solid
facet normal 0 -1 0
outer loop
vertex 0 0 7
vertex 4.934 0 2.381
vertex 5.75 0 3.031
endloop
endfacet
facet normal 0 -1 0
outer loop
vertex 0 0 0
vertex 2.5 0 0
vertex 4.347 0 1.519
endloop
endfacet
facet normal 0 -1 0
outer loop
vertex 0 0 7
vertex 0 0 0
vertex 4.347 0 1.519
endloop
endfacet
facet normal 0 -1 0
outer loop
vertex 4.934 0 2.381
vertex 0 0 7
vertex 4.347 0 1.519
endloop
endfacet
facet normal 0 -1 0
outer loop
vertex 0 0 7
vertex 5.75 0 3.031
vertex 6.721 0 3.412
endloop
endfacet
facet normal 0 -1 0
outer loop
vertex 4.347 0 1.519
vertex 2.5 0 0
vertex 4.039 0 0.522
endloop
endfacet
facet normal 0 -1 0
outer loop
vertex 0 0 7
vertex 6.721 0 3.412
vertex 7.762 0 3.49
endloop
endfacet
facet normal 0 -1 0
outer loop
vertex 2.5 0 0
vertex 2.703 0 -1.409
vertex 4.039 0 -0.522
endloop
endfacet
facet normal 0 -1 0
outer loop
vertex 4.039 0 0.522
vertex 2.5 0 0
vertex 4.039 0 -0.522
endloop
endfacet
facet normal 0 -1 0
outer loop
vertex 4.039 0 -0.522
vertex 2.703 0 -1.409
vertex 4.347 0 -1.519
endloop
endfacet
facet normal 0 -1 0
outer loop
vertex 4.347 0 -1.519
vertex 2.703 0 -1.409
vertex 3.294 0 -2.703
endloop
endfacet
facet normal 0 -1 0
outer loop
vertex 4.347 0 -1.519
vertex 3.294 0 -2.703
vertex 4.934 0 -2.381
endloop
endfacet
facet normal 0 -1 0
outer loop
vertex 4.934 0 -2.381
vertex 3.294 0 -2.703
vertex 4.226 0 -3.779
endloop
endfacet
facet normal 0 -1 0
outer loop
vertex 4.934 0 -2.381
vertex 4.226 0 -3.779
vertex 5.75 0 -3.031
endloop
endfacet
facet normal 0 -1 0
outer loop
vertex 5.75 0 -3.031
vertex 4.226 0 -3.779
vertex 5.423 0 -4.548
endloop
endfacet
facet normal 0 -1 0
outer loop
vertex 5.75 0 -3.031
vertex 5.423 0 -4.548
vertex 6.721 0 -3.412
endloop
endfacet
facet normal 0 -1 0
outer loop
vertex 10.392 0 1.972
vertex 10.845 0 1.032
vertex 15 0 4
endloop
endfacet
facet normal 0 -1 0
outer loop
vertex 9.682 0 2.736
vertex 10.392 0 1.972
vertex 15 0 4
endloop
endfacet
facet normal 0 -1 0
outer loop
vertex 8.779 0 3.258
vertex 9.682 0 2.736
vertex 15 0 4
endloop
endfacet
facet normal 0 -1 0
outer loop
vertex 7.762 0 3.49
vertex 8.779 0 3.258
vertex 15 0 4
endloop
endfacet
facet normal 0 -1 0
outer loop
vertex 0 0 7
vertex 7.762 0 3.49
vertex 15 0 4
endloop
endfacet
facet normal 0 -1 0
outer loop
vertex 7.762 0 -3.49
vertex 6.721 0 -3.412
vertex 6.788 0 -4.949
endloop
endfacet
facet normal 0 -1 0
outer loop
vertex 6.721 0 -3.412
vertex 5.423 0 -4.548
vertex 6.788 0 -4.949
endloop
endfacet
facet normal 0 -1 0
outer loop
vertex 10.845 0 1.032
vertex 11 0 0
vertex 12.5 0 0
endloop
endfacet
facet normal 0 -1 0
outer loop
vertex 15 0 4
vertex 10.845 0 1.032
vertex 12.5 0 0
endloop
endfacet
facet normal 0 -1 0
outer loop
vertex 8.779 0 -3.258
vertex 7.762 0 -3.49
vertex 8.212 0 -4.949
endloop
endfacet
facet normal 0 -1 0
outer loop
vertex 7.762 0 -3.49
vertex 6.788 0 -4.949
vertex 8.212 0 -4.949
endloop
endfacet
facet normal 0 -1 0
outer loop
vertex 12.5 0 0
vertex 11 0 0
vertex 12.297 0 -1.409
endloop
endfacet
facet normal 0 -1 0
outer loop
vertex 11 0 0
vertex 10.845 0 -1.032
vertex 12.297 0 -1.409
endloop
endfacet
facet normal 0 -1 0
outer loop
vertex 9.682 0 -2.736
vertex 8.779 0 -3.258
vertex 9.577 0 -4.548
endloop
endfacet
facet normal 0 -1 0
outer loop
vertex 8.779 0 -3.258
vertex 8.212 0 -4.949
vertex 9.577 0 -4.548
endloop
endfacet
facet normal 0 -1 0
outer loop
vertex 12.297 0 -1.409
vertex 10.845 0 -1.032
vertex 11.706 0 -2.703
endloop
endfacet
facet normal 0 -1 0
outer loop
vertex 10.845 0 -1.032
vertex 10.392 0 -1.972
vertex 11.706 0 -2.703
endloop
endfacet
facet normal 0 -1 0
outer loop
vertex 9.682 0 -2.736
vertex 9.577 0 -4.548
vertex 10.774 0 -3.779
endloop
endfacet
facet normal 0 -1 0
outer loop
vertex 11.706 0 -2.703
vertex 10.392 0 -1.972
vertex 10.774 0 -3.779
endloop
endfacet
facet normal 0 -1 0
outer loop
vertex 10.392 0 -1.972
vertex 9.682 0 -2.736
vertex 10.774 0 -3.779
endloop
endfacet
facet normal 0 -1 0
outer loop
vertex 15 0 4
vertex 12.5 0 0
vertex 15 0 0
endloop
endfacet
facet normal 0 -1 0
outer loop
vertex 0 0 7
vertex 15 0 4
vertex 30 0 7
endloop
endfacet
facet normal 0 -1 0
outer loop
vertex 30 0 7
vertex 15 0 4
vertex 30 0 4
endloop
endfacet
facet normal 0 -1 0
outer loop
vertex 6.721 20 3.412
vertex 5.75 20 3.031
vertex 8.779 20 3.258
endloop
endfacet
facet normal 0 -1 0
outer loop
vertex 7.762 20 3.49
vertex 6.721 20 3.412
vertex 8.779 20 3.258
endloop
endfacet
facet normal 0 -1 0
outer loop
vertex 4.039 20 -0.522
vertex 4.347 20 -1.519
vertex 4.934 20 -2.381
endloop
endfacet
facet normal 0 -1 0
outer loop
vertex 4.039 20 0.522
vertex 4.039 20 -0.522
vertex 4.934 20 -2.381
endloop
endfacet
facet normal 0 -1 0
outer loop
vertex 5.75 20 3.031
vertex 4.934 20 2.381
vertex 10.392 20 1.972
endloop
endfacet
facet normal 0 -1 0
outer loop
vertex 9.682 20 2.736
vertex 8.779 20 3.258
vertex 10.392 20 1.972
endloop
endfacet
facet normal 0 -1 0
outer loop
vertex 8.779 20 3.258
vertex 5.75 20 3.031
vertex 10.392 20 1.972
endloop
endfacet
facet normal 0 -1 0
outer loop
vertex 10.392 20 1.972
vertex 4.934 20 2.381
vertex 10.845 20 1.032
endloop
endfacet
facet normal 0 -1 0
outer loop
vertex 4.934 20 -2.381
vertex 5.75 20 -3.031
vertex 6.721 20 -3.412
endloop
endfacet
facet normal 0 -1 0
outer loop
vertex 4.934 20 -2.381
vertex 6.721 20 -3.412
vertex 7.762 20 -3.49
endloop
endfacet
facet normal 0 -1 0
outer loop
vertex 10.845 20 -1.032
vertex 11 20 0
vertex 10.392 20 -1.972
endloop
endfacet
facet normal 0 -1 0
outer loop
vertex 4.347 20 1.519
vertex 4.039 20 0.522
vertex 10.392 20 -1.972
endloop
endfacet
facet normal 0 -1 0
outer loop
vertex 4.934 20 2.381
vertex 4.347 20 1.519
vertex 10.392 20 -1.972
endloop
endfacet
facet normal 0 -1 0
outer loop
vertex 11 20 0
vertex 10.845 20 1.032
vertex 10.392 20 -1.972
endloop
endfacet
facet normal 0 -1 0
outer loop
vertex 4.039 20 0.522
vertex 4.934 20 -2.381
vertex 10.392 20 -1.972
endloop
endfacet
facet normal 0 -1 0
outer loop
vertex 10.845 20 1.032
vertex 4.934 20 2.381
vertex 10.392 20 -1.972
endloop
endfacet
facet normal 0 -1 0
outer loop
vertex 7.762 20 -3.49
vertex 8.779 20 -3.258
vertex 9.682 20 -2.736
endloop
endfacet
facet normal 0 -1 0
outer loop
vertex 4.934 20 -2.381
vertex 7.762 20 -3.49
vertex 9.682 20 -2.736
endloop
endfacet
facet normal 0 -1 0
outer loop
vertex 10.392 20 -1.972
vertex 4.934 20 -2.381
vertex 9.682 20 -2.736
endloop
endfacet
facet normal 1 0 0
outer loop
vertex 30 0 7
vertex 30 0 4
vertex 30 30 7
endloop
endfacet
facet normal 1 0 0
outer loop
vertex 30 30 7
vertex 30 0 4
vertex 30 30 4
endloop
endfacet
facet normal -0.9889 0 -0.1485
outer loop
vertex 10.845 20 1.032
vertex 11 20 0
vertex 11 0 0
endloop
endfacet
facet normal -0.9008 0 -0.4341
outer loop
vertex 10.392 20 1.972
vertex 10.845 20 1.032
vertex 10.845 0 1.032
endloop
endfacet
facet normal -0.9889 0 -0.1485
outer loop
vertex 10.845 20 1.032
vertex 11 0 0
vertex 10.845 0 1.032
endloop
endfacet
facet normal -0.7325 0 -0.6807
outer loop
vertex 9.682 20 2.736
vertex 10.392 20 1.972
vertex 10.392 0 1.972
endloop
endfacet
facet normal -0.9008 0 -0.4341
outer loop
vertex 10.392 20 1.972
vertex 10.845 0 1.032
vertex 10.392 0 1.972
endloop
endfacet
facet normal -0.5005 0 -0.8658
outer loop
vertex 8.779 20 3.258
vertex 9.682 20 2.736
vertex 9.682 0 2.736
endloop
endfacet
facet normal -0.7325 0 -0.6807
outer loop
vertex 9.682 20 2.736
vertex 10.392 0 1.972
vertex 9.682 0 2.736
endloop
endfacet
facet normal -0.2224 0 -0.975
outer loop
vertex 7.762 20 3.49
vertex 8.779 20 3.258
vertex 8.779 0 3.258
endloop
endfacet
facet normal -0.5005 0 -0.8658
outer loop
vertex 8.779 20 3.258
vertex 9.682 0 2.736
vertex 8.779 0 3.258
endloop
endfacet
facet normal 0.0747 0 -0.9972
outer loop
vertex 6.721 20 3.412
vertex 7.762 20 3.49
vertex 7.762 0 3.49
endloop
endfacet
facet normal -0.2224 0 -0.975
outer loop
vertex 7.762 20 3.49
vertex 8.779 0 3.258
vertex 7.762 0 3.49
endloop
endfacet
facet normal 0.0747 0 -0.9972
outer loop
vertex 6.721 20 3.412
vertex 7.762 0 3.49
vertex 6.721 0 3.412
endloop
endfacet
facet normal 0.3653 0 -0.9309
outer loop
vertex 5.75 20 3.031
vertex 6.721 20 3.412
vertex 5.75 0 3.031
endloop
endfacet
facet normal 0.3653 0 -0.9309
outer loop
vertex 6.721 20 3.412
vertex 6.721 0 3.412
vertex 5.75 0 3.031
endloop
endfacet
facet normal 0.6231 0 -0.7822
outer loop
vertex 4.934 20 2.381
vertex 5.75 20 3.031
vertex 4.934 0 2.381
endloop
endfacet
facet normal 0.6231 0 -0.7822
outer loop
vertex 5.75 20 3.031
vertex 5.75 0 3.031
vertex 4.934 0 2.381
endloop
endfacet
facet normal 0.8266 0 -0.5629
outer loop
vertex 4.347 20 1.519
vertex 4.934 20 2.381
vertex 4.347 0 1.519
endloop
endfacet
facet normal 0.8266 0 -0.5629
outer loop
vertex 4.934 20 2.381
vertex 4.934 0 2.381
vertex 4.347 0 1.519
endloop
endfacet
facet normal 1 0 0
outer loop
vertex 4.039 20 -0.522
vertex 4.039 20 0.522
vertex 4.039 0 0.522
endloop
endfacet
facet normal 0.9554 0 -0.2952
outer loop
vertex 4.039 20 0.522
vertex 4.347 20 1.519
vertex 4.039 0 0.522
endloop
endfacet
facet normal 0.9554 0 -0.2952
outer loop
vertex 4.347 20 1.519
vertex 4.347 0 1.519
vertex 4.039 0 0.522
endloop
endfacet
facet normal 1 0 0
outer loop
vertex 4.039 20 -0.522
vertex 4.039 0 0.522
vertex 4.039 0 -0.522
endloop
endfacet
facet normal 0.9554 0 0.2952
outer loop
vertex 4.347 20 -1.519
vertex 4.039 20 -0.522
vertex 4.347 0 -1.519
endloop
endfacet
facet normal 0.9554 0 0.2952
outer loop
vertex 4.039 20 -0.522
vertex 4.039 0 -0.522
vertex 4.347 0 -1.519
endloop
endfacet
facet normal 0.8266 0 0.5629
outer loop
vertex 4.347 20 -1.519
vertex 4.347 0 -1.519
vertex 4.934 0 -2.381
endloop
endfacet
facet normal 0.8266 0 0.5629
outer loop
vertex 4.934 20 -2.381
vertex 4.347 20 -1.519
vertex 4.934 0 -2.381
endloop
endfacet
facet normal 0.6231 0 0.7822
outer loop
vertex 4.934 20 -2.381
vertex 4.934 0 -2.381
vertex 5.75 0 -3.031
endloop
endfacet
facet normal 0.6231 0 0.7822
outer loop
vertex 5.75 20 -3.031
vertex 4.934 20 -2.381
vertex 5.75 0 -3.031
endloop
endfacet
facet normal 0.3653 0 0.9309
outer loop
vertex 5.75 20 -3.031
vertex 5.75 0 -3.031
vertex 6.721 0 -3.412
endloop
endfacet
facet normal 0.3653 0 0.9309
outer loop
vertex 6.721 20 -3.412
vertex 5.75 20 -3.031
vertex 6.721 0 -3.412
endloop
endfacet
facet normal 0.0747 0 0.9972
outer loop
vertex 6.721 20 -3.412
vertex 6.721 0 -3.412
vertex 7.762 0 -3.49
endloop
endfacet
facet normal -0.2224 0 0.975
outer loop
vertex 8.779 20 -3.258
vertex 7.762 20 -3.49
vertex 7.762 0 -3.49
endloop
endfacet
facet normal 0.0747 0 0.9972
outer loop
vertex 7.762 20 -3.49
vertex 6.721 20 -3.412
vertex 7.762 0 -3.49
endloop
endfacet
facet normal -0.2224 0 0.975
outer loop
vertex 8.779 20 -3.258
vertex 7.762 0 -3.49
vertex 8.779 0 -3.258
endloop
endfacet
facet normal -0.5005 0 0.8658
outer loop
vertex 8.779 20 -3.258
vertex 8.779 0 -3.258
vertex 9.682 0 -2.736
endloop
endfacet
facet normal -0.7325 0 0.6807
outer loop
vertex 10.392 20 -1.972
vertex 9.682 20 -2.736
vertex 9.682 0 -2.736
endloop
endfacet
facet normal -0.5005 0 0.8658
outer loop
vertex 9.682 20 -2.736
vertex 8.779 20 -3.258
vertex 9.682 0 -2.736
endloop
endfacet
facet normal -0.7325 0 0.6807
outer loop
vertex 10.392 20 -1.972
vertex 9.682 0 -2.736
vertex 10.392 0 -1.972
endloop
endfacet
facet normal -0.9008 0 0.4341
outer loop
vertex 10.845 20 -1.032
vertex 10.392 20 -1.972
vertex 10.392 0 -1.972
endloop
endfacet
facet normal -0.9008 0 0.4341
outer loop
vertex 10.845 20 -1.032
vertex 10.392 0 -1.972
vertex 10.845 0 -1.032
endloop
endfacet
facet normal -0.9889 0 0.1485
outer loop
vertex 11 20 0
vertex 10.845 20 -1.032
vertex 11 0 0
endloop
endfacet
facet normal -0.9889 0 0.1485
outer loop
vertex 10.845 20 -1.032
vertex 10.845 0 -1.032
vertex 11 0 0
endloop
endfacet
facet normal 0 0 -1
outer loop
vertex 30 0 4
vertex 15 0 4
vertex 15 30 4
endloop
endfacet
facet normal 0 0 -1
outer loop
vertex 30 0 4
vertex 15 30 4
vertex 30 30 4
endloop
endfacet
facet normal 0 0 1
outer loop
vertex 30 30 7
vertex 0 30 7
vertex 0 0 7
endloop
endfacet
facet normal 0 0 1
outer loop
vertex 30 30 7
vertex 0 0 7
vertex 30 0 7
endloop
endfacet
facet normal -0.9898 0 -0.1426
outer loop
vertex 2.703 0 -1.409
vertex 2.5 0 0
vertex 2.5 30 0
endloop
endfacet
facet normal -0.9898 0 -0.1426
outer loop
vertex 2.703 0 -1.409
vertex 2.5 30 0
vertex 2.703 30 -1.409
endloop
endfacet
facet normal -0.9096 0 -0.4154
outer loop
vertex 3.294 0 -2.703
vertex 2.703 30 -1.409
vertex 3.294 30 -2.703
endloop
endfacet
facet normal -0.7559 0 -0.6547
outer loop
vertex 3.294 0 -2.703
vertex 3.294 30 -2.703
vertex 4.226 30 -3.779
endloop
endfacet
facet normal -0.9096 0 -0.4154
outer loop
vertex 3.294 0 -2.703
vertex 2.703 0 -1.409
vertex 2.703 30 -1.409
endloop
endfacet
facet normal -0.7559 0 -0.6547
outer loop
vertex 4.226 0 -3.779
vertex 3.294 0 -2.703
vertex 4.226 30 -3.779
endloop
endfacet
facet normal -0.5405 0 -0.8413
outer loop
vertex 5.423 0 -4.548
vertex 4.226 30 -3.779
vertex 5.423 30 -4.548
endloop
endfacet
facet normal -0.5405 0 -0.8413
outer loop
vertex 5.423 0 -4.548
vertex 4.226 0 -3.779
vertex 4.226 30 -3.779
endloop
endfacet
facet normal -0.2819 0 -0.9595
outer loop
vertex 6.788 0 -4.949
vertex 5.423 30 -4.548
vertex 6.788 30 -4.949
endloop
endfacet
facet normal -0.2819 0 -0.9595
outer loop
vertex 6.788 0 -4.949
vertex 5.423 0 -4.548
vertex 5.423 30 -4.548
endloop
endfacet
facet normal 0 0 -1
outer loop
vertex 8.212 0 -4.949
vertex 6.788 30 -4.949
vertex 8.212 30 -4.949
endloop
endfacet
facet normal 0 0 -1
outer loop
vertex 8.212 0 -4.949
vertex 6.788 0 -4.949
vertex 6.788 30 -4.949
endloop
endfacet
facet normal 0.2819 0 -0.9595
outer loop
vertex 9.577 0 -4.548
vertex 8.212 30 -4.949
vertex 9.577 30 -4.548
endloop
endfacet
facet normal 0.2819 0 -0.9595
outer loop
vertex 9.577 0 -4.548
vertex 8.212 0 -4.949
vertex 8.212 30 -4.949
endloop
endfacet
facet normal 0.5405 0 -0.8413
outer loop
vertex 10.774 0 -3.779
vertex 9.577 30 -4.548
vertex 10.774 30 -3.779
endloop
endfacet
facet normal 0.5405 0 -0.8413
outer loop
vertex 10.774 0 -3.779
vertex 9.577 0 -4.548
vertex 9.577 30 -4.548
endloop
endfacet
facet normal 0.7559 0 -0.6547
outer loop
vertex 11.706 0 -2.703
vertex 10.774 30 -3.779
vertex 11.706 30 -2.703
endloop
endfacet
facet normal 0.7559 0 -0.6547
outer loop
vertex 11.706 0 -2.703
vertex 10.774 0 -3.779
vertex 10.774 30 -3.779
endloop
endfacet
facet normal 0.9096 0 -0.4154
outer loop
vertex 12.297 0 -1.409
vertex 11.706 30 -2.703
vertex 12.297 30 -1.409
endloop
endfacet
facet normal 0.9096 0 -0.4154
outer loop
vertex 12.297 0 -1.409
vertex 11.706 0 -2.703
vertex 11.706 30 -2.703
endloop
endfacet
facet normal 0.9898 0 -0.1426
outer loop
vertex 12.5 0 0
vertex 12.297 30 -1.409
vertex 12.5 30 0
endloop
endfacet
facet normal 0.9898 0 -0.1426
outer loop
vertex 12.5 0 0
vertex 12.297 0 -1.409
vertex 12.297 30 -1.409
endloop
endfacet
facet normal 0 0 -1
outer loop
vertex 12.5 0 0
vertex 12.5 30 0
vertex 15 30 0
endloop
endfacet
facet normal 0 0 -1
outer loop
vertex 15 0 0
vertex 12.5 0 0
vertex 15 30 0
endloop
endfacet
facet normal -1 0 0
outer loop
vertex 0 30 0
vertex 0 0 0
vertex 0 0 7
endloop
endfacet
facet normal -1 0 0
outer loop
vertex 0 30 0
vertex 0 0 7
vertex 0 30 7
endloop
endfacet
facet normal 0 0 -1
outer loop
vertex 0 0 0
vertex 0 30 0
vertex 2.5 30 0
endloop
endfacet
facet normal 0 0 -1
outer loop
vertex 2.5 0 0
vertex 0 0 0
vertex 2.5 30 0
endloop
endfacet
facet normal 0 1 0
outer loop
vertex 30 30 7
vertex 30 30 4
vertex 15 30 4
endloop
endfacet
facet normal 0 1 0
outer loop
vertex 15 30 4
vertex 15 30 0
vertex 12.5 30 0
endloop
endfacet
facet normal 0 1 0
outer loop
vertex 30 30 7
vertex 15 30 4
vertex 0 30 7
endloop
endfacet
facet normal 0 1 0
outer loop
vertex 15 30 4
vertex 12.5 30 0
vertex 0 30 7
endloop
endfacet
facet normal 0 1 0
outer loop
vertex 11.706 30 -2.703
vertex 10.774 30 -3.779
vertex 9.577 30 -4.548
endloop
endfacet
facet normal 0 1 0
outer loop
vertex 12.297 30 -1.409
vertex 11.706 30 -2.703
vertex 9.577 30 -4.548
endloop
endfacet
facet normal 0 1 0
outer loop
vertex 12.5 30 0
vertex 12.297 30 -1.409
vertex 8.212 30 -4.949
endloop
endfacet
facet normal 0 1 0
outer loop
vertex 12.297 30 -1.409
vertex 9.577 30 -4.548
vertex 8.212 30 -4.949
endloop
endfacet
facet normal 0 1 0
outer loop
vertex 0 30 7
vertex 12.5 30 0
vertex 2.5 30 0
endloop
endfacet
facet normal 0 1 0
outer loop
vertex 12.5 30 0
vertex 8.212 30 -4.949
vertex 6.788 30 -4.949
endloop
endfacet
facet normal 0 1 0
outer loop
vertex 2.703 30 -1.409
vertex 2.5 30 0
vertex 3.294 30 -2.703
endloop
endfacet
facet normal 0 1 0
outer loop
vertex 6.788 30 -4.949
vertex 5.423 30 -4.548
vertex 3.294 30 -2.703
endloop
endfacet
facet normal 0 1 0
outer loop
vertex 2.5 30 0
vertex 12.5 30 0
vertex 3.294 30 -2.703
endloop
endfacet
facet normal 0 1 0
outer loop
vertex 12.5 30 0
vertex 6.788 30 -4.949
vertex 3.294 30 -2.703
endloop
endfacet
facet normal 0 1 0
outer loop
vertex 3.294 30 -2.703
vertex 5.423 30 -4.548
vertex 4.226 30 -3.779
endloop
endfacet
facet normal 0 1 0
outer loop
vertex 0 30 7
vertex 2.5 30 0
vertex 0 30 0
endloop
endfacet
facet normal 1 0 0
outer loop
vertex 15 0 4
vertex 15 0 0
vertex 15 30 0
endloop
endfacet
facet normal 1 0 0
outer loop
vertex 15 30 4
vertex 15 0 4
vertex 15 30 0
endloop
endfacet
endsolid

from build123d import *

# Parameters (mm, degrees)
SKETCH1_W               = 30
SKETCH1_H               = 30
BOSS_EXTRUDE1_DEPTH     = 10
SKETCH2_W               = 15
SKETCH2_H               = 30
CUT_EXTRUDE1_DEPTH      = 4
SKETCH4_R               = 1.75
CUT_EXTRUDE3_DEPTH      = 30
SKETCH7_R               = 5
BOSS_EXTRUDE2_DEPTH     = 40
SKETCH8_R               = 3.5
CUT_EXTRUDE4_DEPTH      = 30
SKETCH9_W               = 3
SKETCH9_H               = 30
CUT_EXTRUDE5_DEPTH      = 31
SKETCH11_W              = 33.170745935
SKETCH11_H              = 13.10963014
CUT_EXTRUDE6_DEPTH      = 6
CUT_EXTRUDE6_DEPTH_BACK = 8
SKETCH12_R              = 3.5
BOSS_EXTRUDE3_DEPTH     = 10
BOSS_EXTRUDE4_DEPTH     = 3


with BuildPart() as part:
    # Sketch1 → Boss-Extrude1 (new body)
    with BuildSketch(Plane.XY):
        with Locations((15, 15)):
            Rectangle(SKETCH1_W, SKETCH1_H)
    extrude(amount=BOSS_EXTRUDE1_DEPTH)

    # Sketch2 → Cut-Extrude1 (cut)
    with BuildSketch(Plane(origin=(0, 0, 0), x_dir=(-1, 0, 0), z_dir=(0, 0, -1))):
        with Locations((-22.5, 15)):
            Rectangle(SKETCH2_W, SKETCH2_H)
    extrude(amount=-CUT_EXTRUDE1_DEPTH, mode=Mode.SUBTRACT)

    # Sketch4 → Cut-Extrude3 (cut)
    with BuildSketch(Plane(origin=(0, 0, 4), x_dir=(-1, 0, 0), z_dir=(0, 0, -1))):
        with Locations((-22.5, 0)):
            Circle(SKETCH4_R)
        with Locations((-22.5, 30)):
            Circle(SKETCH4_R)
    extrude(amount=-CUT_EXTRUDE3_DEPTH, mode=Mode.SUBTRACT)

    # Sketch7 → Boss-Extrude2 (add)
    with BuildSketch(Plane.XZ):
        with Locations((7.5, 0)):
            Circle(SKETCH7_R)
    extrude(amount=-BOSS_EXTRUDE2_DEPTH)

    # Sketch8 → Cut-Extrude4 (cut)
    with BuildSketch(Plane.XZ):
        with Locations((7.5, 0)):
            Circle(SKETCH8_R)
    extrude(amount=-CUT_EXTRUDE4_DEPTH, mode=Mode.SUBTRACT)

    # Sketch9 → Cut-Extrude5 (cut, through all)
    with BuildSketch(Plane.ZY):
        with Locations((8.5, 15)):
            Rectangle(SKETCH9_W, SKETCH9_H)
    extrude(amount=-CUT_EXTRUDE5_DEPTH, mode=Mode.SUBTRACT)

    # Sketch11 → Cut-Extrude6 (cut, two sides)
    with BuildSketch(Plane(origin=(0, 0, 0), x_dir=(-1, 0, 0), z_dir=(0, 0, -1))) as cut_extrude6_sk:
        with Locations((-15.51660734, 36.55481507)):
            Rectangle(SKETCH11_W, SKETCH11_H)
    extrude(amount=CUT_EXTRUDE6_DEPTH, mode=Mode.SUBTRACT)
    extrude(cut_extrude6_sk.sketch, amount=-CUT_EXTRUDE6_DEPTH_BACK, mode=Mode.SUBTRACT)

    # Sketch12 → Boss-Extrude3 (add)
    with BuildSketch(Plane(origin=(0, 30, 0), x_dir=(1, 0, 0), z_dir=(0, 1, 0))):
        with Locations((7.5, 0)):
            Circle(SKETCH12_R)
    extrude(amount=-BOSS_EXTRUDE3_DEPTH)

    # Sketch13 → Boss-Extrude4 (add)
    with BuildSketch(Plane(origin=(0, 0, 4), x_dir=(-1, 0, 0), z_dir=(0, 0, -1))):
        with BuildLine():
            Line((-24.25, 30), (-20.75, 30))
            ThreePointArc((-20.75, 30), (-22.5, 28.25), (-24.25, 30))
        make_face()
        with BuildLine():
            Line((-24.25, 0), (-20.75, 0))
            ThreePointArc((-20.75, 0), (-22.5, 1.75), (-24.25, 0))
        make_face()
    extrude(amount=-BOSS_EXTRUDE4_DEPTH)


solid = part.part
